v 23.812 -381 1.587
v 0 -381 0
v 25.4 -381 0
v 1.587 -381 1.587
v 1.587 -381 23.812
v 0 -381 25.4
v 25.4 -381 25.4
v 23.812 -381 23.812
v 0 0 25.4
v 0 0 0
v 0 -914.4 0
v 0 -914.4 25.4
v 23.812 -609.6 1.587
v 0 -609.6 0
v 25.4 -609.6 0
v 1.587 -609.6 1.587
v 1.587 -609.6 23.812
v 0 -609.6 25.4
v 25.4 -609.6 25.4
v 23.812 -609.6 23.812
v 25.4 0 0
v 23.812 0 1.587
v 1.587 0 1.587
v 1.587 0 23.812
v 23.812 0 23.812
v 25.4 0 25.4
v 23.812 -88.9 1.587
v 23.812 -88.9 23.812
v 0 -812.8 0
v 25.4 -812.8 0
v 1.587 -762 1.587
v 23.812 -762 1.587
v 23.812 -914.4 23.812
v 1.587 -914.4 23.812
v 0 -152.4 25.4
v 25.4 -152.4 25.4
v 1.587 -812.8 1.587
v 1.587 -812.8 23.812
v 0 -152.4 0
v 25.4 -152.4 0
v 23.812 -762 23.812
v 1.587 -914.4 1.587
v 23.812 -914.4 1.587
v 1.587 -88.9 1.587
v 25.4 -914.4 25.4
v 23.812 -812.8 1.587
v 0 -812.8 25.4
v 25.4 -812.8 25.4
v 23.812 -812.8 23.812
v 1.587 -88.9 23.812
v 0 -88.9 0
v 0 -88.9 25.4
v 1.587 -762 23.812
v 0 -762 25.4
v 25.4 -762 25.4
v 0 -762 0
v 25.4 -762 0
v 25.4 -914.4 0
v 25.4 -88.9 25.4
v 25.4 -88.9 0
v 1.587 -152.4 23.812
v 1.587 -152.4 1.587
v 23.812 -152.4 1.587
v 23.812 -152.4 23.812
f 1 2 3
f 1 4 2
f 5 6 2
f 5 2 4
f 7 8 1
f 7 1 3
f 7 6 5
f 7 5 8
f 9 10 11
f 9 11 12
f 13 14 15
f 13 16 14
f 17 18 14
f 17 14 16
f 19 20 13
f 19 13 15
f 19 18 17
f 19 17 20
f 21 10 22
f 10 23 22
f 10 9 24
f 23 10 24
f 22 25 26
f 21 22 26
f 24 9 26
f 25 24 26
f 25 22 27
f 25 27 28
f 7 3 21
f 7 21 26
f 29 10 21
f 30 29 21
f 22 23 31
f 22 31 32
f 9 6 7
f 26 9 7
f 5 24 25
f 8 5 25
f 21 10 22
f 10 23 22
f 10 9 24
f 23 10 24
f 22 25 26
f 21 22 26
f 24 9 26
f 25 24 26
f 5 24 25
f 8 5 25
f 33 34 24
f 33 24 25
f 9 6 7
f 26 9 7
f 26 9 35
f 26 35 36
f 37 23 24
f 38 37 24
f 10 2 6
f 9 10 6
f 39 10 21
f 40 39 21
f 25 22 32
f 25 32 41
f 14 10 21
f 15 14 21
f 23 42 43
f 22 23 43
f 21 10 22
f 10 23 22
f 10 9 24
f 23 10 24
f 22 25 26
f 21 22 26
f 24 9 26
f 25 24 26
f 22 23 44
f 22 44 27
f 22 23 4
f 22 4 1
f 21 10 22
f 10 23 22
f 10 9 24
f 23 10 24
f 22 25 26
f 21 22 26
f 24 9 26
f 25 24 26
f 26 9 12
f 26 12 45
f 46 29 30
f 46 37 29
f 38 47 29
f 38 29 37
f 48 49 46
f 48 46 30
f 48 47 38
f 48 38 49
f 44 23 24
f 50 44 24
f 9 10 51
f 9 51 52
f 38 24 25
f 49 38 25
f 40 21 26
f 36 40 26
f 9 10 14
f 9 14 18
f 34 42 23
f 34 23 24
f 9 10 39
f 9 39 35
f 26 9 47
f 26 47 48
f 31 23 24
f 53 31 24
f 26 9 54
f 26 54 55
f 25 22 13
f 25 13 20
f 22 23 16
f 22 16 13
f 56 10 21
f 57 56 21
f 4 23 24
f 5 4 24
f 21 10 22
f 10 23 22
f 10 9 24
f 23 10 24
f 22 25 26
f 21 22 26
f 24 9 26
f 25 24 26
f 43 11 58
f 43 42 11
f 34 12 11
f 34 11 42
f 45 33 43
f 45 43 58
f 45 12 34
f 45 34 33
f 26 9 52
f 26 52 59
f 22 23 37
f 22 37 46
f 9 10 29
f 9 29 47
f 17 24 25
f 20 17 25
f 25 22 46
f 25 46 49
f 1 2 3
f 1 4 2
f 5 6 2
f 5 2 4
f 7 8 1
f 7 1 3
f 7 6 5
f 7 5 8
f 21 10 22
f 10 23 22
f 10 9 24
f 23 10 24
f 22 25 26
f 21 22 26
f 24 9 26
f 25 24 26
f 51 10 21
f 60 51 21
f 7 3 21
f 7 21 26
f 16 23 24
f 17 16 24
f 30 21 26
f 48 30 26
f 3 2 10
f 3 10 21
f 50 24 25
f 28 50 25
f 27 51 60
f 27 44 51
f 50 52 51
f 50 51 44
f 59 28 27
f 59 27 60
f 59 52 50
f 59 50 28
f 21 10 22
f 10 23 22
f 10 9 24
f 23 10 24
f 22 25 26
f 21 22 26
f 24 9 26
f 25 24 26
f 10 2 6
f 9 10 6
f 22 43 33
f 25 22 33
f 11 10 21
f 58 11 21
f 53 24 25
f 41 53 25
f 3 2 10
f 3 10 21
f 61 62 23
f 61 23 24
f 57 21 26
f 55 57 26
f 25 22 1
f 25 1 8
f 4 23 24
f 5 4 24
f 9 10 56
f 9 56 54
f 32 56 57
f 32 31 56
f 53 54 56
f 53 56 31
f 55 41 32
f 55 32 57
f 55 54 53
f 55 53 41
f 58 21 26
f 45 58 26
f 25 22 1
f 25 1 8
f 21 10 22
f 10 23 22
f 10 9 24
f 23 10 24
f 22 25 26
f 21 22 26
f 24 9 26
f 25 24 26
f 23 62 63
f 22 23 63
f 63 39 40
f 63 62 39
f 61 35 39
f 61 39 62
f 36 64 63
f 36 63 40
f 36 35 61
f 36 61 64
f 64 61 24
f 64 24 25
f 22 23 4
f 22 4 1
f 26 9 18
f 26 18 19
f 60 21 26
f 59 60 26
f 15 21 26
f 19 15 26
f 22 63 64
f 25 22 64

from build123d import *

# Parameters (mm, degrees)
F0_W     = 25.4
F0_H     = 25.4
F0_W_2   = 22.225
F0_H_2   = 22.225
F1_DEPTH = 914.4
F2_DEPTH = 152.4
F3_DEPTH = 381
F4_DEPTH = 381
F5_DEPTH = 609.6
F6_DEPTH = 812.8
F7_DEPTH = 88.9
F8_DEPTH = 762


with BuildPart() as f1:
    # F0 (on Front) → F1 (new body)
    with BuildSketch(Plane.XZ):
        with Locations((12.7, 12.7)):
            Rectangle(F0_W, F0_H)
        with Locations((12.7, 12.7)):
            Rectangle(F0_W_2, F0_H_2, mode=Mode.SUBTRACT)
    extrude(amount=F1_DEPTH)


with BuildPart() as f2:
    # F0 (on Front) → F2 (new body)
    with BuildSketch(Plane.XZ):
        with Locations((12.7, 12.7)):
            Rectangle(F0_W, F0_H)
        with Locations((12.7, 12.7)):
            Rectangle(F0_W_2, F0_H_2, mode=Mode.SUBTRACT)
    extrude(amount=F2_DEPTH)


with BuildPart() as f3:
    # F0 (on Front) → F3 (new body)
    with BuildSketch(Plane.XZ):
        with Locations((12.7, 12.7)):
            Rectangle(F0_W, F0_H)
        with Locations((12.7, 12.7)):
            Rectangle(F0_W_2, F0_H_2, mode=Mode.SUBTRACT)
    extrude(amount=F3_DEPTH)


with BuildPart() as f4:
    # F0 (on Front) → F4 (new body)
    with BuildSketch(Plane.XZ):
        with Locations((12.7, 12.7)):
            Rectangle(F0_W, F0_H)
        with Locations((12.7, 12.7)):
            Rectangle(F0_W_2, F0_H_2, mode=Mode.SUBTRACT)
    extrude(amount=F4_DEPTH)


with BuildPart() as f5:
    # F0 (on Front) → F5 (new body)
    with BuildSketch(Plane.XZ):
        with Locations((12.7, 12.7)):
            Rectangle(F0_W, F0_H)
        with Locations((12.7, 12.7)):
            Rectangle(F0_W_2, F0_H_2, mode=Mode.SUBTRACT)
    extrude(amount=F5_DEPTH)


with BuildPart() as f6:
    # F0 (on Front) → F6 (new body)
    with BuildSketch(Plane.XZ):
        with Locations((12.7, 12.7)):
            Rectangle(F0_W, F0_H)
        with Locations((12.7, 12.7)):
            Rectangle(F0_W_2, F0_H_2, mode=Mode.SUBTRACT)
    extrude(amount=F6_DEPTH)


with BuildPart() as f7:
    # F0 (on Front) → F7 (new body)
    with BuildSketch(Plane.XZ):
        with Locations((12.7, 12.7)):
            Rectangle(F0_W, F0_H)
        with Locations((12.7, 12.7)):
            Rectangle(F0_W_2, F0_H_2, mode=Mode.SUBTRACT)
    extrude(amount=F7_DEPTH)


with BuildPart() as f8:
    # F0 (on Front) → F8 (new body)
    with BuildSketch(Plane.XZ):
        with Locations((12.7, 12.7)):
            Rectangle(F0_W, F0_H)
        with Locations((12.7, 12.7)):
            Rectangle(F0_W_2, F0_H_2, mode=Mode.SUBTRACT)
    extrude(amount=F8_DEPTH)


solid = Compound([f1.part, f2.part, f3.part, f4.part, f5.part, f6.part, f7.part, f8.part])
